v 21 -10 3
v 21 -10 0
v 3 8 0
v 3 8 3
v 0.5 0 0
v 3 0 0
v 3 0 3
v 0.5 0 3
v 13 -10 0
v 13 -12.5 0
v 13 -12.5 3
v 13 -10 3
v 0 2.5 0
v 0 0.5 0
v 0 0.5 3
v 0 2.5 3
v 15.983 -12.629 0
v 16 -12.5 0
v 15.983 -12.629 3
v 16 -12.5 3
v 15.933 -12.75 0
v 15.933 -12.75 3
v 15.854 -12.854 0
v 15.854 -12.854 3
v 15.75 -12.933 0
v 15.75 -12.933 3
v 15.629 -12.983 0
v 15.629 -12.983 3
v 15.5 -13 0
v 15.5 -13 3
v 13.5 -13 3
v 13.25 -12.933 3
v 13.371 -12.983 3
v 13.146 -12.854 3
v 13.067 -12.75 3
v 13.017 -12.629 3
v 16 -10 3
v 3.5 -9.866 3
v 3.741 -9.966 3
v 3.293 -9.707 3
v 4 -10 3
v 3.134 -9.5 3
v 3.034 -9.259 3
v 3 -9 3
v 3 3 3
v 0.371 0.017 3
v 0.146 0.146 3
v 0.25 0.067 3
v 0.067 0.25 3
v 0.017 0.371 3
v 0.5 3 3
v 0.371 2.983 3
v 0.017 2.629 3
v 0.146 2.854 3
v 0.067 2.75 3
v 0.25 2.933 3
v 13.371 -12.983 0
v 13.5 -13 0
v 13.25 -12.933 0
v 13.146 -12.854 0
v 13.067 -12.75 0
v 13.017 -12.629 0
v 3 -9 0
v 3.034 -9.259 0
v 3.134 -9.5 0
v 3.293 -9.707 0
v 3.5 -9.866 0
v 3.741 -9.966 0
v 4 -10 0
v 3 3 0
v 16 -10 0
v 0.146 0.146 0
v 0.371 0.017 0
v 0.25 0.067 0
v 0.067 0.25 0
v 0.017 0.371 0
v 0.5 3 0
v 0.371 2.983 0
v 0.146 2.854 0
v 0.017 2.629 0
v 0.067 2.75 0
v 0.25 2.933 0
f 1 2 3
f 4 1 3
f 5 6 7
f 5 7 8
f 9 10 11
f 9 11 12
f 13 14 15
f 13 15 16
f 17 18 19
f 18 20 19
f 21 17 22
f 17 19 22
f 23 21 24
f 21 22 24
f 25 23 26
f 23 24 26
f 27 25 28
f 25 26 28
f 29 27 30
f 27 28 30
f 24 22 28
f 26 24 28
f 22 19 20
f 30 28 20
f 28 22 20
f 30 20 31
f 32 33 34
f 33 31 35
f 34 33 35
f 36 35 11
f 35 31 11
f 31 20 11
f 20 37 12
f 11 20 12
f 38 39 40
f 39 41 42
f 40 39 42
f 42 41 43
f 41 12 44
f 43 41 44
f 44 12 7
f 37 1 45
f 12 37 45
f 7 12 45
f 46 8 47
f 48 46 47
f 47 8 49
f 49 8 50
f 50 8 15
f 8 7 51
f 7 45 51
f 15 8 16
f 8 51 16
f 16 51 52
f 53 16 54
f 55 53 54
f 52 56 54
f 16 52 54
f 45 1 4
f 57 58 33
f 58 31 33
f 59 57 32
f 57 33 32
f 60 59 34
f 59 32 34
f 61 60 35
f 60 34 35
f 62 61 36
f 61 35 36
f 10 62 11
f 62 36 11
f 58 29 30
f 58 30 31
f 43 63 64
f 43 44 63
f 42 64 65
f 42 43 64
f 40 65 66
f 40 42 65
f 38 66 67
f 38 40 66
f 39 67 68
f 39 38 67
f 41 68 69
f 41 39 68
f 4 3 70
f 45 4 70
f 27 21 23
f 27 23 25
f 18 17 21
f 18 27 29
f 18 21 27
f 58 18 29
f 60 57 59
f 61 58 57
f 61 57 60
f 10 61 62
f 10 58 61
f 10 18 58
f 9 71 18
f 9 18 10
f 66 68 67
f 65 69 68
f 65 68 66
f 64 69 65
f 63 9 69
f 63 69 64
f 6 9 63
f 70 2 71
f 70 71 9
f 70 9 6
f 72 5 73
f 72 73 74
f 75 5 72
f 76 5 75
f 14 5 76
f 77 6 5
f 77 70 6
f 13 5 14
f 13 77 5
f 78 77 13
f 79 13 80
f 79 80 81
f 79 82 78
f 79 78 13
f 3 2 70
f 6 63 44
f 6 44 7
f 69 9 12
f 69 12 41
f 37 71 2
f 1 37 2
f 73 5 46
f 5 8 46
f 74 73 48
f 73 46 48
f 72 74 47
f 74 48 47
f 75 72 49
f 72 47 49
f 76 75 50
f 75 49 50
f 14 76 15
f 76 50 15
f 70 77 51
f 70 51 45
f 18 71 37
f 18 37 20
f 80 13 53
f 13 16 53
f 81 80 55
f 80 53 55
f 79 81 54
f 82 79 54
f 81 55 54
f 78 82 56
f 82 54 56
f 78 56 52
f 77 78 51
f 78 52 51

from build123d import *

# Parameters (mm, degrees)
EXTRUDE_1_DEPTH = 3
FILLET_1_R      = 0.5
FILLET_2_R      = 1


with BuildPart() as part:
    # Эскиз1 → Бобышка-Вытянуть1 (new body)
    with BuildSketch(Plane.XY):
        Polygon((3, 0), (0, 0), (0, 3), (8, 3), (16, -5), (16, -13), (13, -13), (13, -10), (3, -10), align=None)
        Polygon((3, 8), (3, 3), (8, 3), align=None)
        Polygon((21, -10), (16, -5), (16, -10), align=None)
    extrude(amount=EXTRUDE_1_DEPTH)

    # Скругление1
    fillet_1_edges = [part.edges().sort_by_distance(p)[0] for p in [
        (0, 0, 1.5),
        (0, 3, 1.5),
        (16, -13, 1.5),
        (13, -13, 1.5),
    ]]
    fillet(fillet_1_edges, radius=FILLET_1_R)

    # Скругление2
    fillet_2_edges = [part.edges().sort_by_distance(p)[0] for p in [
        (3, -10, 1.5),
    ]]
    fillet(fillet_2_edges, radius=FILLET_2_R)


solid = part.part
